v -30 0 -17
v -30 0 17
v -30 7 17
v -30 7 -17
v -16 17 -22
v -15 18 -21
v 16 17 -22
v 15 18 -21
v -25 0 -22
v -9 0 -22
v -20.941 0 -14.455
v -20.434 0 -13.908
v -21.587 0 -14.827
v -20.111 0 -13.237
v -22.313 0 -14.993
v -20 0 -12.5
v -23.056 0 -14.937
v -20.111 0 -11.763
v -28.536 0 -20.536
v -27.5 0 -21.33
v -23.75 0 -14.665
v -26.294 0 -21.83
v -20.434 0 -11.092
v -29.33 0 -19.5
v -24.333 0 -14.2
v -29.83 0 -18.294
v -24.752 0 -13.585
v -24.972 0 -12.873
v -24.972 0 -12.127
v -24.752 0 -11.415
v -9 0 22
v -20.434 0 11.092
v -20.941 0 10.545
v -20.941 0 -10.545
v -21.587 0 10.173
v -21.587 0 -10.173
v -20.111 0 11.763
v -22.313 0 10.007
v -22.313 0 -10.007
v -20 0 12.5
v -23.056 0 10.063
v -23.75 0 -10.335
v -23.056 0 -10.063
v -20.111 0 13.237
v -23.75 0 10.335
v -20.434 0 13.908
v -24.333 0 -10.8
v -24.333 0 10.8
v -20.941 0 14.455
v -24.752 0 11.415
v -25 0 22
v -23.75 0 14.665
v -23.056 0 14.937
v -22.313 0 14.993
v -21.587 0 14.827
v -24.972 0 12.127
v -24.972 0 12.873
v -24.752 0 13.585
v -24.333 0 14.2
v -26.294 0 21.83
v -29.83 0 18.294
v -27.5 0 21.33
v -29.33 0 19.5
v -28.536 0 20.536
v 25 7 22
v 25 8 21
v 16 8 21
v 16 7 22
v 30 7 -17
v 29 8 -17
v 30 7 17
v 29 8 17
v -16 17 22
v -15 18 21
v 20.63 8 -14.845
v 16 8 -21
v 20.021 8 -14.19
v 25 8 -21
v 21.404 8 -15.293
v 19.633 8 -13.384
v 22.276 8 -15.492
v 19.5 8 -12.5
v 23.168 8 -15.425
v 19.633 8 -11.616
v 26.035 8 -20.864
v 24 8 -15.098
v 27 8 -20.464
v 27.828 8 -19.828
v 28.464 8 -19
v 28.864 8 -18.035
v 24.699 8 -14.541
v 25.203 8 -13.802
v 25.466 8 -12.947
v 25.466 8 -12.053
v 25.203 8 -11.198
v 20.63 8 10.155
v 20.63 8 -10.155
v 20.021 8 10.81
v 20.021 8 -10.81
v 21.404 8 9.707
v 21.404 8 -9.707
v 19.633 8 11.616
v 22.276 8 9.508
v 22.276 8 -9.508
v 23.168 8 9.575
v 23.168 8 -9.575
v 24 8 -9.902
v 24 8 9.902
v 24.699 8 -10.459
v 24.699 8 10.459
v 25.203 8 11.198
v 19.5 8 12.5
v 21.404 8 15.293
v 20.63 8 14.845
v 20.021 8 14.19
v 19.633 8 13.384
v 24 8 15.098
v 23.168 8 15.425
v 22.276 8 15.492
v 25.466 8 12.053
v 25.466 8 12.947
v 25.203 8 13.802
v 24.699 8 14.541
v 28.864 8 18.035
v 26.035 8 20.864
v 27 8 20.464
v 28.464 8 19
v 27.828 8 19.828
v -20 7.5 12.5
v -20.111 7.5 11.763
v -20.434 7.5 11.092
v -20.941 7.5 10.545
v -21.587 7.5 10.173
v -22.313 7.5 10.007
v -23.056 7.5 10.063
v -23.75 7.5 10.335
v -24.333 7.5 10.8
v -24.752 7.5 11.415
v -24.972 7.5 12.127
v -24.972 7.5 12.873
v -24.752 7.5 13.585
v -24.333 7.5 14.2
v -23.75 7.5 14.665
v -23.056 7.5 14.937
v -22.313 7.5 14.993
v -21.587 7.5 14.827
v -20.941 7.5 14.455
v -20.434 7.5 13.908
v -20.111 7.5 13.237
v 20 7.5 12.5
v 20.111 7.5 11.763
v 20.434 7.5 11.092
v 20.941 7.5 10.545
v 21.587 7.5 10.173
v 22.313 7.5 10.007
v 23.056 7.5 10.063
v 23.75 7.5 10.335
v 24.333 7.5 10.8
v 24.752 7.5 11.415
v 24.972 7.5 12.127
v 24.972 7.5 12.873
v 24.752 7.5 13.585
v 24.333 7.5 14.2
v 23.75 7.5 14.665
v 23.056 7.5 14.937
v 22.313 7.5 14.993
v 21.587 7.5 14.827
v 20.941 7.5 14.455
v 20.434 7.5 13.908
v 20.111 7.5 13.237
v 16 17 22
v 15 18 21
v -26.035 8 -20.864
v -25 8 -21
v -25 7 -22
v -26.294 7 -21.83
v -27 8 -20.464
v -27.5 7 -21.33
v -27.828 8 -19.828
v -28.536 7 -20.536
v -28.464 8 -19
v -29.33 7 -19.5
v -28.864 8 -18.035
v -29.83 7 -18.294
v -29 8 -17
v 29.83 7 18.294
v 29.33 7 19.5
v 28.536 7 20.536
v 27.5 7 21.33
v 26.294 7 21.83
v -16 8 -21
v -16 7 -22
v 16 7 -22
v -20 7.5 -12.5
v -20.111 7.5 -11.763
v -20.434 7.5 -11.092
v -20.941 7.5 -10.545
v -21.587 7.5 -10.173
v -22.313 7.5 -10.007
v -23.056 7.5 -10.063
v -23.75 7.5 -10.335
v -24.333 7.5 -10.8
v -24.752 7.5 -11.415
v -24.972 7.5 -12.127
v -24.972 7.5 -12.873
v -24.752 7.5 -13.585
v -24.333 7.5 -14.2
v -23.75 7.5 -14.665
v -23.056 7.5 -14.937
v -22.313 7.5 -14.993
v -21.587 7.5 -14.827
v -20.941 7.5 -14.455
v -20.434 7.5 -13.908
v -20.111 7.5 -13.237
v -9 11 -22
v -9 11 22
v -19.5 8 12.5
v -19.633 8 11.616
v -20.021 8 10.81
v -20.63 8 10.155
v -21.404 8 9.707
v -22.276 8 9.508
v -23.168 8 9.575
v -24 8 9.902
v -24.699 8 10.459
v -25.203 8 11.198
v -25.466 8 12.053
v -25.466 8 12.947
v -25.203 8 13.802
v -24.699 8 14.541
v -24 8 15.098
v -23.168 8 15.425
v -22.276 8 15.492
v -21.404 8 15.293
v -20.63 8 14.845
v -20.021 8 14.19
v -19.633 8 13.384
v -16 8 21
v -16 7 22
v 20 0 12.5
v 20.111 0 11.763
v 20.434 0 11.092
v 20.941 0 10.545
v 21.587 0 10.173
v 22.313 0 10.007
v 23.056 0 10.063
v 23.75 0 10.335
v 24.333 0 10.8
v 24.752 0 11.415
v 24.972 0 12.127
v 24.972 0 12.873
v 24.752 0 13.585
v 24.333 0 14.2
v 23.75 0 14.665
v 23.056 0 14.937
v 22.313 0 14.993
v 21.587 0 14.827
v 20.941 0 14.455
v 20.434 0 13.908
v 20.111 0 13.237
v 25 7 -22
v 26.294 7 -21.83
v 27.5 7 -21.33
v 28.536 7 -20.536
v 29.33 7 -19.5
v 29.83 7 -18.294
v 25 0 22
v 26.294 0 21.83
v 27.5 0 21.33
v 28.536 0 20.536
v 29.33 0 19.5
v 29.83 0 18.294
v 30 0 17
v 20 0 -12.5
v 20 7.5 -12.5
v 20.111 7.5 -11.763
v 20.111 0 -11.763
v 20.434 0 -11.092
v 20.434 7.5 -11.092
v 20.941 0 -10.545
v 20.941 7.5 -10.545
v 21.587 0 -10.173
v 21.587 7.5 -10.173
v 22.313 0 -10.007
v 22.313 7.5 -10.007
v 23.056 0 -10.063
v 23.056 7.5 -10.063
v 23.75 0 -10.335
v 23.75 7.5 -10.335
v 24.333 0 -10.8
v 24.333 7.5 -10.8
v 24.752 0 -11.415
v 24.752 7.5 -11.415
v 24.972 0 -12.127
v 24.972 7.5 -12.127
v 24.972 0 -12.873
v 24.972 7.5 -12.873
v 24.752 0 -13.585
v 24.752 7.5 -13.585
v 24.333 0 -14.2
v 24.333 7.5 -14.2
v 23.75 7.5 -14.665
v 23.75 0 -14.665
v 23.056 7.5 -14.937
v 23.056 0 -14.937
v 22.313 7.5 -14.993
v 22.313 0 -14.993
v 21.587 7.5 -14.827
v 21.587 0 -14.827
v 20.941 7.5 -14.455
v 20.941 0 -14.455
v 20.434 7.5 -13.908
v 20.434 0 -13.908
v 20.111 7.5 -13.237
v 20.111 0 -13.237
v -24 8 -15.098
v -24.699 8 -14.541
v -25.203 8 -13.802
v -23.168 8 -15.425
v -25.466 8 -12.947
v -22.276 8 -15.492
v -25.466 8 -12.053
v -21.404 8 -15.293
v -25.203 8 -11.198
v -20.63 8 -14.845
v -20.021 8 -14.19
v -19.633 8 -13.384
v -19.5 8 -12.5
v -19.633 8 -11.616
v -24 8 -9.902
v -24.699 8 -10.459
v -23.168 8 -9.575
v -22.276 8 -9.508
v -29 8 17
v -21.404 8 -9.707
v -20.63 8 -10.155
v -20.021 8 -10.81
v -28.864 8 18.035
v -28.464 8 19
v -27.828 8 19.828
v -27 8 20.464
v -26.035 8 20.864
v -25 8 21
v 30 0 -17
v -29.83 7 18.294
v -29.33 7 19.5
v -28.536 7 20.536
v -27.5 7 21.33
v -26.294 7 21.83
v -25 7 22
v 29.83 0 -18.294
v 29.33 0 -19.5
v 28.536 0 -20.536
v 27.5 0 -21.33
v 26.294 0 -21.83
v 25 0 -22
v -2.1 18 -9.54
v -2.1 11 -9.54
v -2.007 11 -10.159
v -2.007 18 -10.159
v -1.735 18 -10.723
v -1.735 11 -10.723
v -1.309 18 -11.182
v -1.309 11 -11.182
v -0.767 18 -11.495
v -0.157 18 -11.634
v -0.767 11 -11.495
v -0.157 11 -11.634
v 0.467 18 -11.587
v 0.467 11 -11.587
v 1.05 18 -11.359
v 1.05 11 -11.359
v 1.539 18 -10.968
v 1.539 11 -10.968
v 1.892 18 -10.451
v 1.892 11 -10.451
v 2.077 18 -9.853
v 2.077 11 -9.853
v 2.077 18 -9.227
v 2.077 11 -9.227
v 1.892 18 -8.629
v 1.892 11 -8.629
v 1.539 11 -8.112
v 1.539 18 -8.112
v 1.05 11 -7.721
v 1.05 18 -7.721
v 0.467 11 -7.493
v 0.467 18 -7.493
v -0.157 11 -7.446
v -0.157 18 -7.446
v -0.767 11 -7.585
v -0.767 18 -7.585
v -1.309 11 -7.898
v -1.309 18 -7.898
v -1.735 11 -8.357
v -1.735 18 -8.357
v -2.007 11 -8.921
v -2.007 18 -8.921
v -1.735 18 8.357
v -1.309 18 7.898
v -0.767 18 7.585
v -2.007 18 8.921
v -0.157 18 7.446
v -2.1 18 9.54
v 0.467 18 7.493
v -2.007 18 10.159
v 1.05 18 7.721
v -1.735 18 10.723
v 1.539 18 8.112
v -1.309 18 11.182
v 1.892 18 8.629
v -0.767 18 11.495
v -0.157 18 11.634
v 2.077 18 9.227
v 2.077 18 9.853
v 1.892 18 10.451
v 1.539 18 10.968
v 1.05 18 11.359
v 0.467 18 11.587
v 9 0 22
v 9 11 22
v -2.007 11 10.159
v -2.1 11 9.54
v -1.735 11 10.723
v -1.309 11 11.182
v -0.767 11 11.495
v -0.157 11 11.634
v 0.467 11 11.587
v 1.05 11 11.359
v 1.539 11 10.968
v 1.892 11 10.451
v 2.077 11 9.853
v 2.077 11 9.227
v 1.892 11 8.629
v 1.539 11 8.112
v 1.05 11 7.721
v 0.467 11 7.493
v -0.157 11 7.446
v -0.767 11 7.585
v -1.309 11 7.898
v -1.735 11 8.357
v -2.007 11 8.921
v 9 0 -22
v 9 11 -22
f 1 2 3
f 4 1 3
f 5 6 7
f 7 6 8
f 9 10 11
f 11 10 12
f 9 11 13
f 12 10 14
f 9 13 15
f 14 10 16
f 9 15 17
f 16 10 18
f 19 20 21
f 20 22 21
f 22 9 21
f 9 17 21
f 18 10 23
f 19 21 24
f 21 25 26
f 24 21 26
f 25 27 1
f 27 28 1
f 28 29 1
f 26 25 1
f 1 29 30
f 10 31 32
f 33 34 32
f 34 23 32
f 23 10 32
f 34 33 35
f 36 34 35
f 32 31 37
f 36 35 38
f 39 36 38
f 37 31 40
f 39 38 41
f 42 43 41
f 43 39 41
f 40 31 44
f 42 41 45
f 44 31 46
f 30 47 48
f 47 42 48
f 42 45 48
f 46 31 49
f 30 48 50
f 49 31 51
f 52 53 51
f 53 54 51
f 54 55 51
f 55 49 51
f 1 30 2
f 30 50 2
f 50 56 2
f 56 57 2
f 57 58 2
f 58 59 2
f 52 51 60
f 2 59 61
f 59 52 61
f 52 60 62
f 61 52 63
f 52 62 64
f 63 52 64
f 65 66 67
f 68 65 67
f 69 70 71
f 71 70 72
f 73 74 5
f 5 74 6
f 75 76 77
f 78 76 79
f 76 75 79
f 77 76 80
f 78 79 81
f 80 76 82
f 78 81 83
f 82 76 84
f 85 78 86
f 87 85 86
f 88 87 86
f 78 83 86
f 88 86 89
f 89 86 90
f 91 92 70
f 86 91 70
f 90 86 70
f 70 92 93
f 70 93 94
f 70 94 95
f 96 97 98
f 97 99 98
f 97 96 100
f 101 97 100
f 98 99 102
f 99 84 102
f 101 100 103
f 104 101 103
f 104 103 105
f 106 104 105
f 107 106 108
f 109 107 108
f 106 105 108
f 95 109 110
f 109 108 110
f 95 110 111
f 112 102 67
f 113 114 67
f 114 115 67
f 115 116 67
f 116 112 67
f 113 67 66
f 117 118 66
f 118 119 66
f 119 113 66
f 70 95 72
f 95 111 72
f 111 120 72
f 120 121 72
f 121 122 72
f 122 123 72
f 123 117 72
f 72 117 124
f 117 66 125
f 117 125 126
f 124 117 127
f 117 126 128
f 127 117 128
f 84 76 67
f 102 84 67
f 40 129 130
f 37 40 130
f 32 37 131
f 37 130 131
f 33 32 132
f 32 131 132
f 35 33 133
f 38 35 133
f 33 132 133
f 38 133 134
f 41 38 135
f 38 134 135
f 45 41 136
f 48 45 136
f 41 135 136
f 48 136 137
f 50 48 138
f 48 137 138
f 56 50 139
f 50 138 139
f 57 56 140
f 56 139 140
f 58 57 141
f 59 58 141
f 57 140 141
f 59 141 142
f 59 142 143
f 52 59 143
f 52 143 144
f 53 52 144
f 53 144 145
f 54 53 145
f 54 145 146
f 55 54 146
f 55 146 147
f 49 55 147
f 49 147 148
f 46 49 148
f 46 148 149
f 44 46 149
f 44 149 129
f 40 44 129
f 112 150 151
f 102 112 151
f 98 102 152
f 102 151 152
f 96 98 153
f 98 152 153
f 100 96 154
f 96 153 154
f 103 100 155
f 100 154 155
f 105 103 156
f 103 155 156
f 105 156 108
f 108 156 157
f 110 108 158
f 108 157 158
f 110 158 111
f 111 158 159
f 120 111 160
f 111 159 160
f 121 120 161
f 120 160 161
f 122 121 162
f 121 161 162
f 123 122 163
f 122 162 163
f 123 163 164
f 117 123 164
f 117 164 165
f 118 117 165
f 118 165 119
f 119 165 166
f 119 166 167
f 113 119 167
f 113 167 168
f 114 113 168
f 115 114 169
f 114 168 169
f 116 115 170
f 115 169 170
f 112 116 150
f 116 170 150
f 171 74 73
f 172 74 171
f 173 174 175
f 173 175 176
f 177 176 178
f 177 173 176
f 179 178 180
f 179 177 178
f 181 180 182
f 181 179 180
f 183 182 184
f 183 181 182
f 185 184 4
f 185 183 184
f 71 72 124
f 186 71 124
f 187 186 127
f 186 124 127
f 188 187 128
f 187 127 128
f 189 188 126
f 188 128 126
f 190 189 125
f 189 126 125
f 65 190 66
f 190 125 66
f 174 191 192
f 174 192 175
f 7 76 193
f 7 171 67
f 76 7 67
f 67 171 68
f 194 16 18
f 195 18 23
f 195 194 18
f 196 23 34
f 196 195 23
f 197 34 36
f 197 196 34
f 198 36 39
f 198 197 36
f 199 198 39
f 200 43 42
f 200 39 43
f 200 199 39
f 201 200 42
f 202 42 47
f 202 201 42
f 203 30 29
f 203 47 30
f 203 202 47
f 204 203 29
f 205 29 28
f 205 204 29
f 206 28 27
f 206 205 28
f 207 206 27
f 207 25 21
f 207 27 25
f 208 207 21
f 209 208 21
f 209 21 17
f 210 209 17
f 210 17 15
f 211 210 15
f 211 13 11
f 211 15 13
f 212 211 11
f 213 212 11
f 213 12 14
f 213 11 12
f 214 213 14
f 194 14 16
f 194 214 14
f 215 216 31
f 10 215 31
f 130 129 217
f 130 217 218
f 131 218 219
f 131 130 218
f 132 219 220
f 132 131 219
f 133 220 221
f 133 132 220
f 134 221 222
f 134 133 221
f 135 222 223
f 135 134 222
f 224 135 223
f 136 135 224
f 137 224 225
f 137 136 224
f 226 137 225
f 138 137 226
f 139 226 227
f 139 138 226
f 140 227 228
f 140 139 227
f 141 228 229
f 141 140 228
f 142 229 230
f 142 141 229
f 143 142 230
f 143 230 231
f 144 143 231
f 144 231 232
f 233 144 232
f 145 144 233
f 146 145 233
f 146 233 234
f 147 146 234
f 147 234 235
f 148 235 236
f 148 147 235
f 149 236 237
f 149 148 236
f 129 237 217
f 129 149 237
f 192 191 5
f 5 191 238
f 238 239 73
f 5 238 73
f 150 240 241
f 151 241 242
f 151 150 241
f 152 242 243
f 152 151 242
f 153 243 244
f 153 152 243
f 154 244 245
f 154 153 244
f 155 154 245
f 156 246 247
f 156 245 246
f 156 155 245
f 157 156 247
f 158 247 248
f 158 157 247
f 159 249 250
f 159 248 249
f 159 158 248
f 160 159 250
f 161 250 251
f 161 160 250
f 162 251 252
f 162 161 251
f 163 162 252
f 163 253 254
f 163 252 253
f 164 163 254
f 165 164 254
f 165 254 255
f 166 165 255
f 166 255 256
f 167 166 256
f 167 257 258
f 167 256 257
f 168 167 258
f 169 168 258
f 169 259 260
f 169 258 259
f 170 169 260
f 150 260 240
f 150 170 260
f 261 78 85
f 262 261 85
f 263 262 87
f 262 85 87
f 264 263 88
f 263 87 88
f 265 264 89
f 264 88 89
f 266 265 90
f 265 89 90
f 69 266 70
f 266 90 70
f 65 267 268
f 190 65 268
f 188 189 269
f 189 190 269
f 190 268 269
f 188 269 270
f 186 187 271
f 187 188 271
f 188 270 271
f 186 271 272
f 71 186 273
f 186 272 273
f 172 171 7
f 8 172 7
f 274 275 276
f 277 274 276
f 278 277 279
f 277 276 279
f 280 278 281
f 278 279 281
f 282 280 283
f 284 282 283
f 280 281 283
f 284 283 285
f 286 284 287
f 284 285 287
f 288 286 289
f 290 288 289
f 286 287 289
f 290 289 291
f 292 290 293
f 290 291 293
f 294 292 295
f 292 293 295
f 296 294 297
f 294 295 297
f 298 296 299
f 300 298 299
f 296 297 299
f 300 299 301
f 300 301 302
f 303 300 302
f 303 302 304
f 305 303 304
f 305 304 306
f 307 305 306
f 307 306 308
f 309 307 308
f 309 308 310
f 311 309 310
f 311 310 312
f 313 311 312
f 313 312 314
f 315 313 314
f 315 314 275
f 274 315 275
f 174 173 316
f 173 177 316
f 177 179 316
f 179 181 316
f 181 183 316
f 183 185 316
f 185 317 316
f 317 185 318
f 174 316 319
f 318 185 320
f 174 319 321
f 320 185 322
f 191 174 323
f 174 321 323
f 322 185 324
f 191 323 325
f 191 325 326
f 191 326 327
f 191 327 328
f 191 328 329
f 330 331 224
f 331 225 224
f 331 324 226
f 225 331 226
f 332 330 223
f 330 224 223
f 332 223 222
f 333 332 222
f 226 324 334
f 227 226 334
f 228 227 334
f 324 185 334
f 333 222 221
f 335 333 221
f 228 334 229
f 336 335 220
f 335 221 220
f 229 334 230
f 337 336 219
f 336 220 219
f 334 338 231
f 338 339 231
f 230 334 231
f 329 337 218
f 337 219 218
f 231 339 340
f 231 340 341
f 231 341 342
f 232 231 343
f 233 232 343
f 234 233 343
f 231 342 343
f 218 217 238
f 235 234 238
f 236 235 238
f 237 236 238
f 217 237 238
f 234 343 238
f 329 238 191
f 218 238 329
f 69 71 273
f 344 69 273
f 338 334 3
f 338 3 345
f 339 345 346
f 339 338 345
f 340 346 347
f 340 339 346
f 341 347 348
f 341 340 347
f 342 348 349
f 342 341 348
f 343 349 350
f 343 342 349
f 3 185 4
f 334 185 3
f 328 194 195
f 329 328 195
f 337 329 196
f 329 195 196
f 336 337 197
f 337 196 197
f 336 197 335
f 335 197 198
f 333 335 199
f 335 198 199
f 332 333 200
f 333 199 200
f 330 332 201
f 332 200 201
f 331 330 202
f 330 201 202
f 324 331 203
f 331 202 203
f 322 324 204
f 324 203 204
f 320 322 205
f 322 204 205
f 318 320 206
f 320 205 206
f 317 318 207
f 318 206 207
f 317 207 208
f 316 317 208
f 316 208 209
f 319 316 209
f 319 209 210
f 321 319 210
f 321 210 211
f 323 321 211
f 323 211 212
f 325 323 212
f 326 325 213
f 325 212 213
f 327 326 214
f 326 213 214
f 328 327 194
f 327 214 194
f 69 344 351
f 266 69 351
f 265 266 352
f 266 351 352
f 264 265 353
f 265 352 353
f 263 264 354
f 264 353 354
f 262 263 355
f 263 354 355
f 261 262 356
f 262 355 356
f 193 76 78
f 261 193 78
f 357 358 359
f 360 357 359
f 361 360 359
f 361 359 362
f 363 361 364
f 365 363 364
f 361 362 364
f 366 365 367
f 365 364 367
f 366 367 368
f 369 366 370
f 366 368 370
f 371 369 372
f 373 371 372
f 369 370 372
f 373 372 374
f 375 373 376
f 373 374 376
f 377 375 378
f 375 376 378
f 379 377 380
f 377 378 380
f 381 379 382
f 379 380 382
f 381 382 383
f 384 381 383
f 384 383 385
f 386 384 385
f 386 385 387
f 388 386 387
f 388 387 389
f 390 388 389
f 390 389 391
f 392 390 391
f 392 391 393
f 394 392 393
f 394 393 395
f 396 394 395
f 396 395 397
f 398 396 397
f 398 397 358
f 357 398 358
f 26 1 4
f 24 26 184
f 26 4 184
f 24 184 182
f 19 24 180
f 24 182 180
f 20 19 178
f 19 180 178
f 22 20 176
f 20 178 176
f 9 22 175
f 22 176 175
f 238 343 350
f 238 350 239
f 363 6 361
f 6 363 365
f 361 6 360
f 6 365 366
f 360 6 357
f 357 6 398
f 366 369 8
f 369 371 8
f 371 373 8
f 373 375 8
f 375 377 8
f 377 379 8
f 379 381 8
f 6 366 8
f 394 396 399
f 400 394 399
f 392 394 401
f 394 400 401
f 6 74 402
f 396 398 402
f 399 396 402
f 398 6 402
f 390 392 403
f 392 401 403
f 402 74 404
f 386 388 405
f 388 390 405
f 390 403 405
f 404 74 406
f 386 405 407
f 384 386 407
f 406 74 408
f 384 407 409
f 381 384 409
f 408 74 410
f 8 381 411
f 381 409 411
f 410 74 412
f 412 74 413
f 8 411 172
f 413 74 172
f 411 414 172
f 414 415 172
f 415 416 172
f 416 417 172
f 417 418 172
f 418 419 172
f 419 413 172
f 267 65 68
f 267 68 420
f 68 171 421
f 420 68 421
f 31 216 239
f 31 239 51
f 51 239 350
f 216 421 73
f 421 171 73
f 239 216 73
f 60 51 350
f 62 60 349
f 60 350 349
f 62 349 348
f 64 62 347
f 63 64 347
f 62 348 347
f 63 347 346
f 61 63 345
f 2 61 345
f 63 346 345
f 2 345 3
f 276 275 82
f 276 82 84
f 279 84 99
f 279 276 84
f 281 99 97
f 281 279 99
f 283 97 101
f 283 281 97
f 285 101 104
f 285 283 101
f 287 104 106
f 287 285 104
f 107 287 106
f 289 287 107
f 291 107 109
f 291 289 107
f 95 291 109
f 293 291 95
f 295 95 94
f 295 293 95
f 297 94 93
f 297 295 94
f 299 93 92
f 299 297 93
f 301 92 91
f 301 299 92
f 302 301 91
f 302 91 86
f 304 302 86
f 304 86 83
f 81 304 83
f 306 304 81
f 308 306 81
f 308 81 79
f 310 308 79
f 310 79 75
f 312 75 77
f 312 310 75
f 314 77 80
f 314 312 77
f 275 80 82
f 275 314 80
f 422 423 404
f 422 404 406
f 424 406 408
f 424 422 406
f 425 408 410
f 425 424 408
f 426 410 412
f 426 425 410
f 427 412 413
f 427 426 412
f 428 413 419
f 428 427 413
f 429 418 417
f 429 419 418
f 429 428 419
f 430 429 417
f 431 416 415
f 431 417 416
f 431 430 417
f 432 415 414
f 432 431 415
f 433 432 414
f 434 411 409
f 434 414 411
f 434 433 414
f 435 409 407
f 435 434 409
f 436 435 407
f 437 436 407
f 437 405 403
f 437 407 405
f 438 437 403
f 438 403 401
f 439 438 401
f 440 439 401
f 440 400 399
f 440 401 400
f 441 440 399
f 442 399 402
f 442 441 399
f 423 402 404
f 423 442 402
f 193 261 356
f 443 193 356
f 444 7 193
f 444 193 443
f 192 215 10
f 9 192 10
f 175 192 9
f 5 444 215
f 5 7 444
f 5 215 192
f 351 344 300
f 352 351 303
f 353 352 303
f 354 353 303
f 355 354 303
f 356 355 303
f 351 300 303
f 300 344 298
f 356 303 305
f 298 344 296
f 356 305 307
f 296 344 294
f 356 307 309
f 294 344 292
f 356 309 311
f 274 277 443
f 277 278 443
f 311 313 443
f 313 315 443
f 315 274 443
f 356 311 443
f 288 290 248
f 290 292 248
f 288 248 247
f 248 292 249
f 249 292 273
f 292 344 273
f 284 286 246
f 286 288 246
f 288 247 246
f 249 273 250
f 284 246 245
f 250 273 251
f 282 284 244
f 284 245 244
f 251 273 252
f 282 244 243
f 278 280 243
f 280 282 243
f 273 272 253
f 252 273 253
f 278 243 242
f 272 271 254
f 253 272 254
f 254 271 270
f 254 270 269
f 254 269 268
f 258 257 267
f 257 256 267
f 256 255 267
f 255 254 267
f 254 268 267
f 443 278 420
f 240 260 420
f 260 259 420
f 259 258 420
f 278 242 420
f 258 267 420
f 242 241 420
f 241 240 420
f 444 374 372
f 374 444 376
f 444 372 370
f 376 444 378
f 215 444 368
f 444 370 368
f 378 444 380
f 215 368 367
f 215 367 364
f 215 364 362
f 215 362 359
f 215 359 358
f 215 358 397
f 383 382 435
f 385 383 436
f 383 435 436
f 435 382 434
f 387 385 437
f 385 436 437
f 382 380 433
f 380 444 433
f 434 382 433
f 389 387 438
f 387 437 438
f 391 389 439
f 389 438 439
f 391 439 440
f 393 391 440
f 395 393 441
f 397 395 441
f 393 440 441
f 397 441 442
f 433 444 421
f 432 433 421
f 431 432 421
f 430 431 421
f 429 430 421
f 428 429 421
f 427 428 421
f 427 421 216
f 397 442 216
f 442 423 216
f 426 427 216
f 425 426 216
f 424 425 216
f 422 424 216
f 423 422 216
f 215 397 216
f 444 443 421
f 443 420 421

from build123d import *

# Parameters (mm, degrees)
EXTRUDE_1_DEPTH          = 22
FILLET_1_R               = 5
CHAMFER_1_SIZE           = 1
SKETCH_4_R               = 2.5
CUT_EXTRUDE_1_DEPTH      = 39.522720569
MIRROR_4_COPY_1_SKETCH_R = 2.5
MIRROR_4_COPY_1_DEPTH    = 39.522720569
CHAMFER_2_SIZE           = 0.5
HOLE_WIZARD_M5_1_D       = 4.2


with BuildPart() as part:
    # 草图1 → 凸台-拉伸1 (new, symmetric)
    with BuildSketch(Plane.XY):
        Polygon((-9, 0), (-30, 0), (-30, 8), (-16, 8), (-16, 18), (16, 18), (16, 8), (30, 8), (30, 0), (9, 0), (9, 11), (-9, 11), align=None)
    extrude(amount=EXTRUDE_1_DEPTH, both=True)

    # 圆角1
    fillet_1_edges = [part.edges().sort_by_distance(p)[0] for p in [
        (-30, 4, 22),
        (30, 4, 22),
        (30, 4, -22),
        (-30, 4, -22),
    ]]
    fillet(fillet_1_edges, radius=FILLET_1_R)

    # 倒角1
    chamfer_1_edges = [part.edges().sort_by_distance(p)[0] for p in [
        (-20.5, 8, 22),
        (0, 18, 22),
        (-16, 18, 0),
        (16, 18, 0),
        (0, 18, -22),
        (-30, 8, 0),
        (20.5, 8, -22),
        (-28.535533906, 8, 20.535533906),
        (-20.5, 8, -22),
        (-28.535533906, 8, -20.535533906),
        (30, 8, 0),
        (20.5, 8, 22),
        (28.535533906, 8, 20.535533906),
        (28.535533906, 8, -20.535533906),
    ]]
    chamfer(chamfer_1_edges, length=CHAMFER_1_SIZE)

    # 草图4 → 切除-拉伸1 (cut, through all)
    with BuildSketch(Plane(origin=(0, 8, 0), x_dir=(1, 0, 0), z_dir=(0, 1, 0))):
        with Locations(Location((22.5, 12.5, 0), (0, 0, 180))):
            Circle(SKETCH_4_R)
    cut_extrude_1 = extrude(amount=-CUT_EXTRUDE_1_DEPTH, mode=Mode.SUBTRACT)

    # 镜向3: 切除-拉伸1 across plane
    add(cut_extrude_1.mirror(Plane(origin=(0, 0, 0), x_dir=(0, 0, 1), z_dir=(1, 0, 0))), mode=Mode.SUBTRACT)

    # 镜向4: 切除-拉伸1 across plane
    add(cut_extrude_1.mirror(Plane.XY), mode=Mode.SUBTRACT)

    # 镜向4 copy 1 sketch → 镜向4 copy 1 (cut, through all)
    with BuildSketch(Plane(origin=(0, 8, 0), x_dir=(-1, 0, 0), z_dir=(0, 1, 0))):
        with Locations(Location((22.5, 12.5, 0), (0, 0, 180))):
            Circle(MIRROR_4_COPY_1_SKETCH_R)
    extrude(amount=-MIRROR_4_COPY_1_DEPTH, mode=Mode.SUBTRACT)

    # 倒角2
    chamfer_2_edges = [part.edges().sort_by_distance(p)[0] for p in [
        (25, 8, -12.5),
        (-25, 8, -12.5),
        (25, 8, 12.5),
        (-25, 8, 12.5),
    ]]
    chamfer(chamfer_2_edges, length=CHAMFER_2_SIZE)

    # M5 螺纹孔1 (through all)
    with Locations(Plane(origin=(0, 18, -9.540064206), x_dir=(1, 0, 0), z_dir=(0, 1, 0))):
        with Locations((0, 0)):
            hole_wizard_m5_1 = Hole(HOLE_WIZARD_M5_1_D / 2)

    # 镜向5: M5 螺纹孔1 across plane
    add(hole_wizard_m5_1.mirror(Plane.XY), mode=Mode.SUBTRACT)


solid = part.part
